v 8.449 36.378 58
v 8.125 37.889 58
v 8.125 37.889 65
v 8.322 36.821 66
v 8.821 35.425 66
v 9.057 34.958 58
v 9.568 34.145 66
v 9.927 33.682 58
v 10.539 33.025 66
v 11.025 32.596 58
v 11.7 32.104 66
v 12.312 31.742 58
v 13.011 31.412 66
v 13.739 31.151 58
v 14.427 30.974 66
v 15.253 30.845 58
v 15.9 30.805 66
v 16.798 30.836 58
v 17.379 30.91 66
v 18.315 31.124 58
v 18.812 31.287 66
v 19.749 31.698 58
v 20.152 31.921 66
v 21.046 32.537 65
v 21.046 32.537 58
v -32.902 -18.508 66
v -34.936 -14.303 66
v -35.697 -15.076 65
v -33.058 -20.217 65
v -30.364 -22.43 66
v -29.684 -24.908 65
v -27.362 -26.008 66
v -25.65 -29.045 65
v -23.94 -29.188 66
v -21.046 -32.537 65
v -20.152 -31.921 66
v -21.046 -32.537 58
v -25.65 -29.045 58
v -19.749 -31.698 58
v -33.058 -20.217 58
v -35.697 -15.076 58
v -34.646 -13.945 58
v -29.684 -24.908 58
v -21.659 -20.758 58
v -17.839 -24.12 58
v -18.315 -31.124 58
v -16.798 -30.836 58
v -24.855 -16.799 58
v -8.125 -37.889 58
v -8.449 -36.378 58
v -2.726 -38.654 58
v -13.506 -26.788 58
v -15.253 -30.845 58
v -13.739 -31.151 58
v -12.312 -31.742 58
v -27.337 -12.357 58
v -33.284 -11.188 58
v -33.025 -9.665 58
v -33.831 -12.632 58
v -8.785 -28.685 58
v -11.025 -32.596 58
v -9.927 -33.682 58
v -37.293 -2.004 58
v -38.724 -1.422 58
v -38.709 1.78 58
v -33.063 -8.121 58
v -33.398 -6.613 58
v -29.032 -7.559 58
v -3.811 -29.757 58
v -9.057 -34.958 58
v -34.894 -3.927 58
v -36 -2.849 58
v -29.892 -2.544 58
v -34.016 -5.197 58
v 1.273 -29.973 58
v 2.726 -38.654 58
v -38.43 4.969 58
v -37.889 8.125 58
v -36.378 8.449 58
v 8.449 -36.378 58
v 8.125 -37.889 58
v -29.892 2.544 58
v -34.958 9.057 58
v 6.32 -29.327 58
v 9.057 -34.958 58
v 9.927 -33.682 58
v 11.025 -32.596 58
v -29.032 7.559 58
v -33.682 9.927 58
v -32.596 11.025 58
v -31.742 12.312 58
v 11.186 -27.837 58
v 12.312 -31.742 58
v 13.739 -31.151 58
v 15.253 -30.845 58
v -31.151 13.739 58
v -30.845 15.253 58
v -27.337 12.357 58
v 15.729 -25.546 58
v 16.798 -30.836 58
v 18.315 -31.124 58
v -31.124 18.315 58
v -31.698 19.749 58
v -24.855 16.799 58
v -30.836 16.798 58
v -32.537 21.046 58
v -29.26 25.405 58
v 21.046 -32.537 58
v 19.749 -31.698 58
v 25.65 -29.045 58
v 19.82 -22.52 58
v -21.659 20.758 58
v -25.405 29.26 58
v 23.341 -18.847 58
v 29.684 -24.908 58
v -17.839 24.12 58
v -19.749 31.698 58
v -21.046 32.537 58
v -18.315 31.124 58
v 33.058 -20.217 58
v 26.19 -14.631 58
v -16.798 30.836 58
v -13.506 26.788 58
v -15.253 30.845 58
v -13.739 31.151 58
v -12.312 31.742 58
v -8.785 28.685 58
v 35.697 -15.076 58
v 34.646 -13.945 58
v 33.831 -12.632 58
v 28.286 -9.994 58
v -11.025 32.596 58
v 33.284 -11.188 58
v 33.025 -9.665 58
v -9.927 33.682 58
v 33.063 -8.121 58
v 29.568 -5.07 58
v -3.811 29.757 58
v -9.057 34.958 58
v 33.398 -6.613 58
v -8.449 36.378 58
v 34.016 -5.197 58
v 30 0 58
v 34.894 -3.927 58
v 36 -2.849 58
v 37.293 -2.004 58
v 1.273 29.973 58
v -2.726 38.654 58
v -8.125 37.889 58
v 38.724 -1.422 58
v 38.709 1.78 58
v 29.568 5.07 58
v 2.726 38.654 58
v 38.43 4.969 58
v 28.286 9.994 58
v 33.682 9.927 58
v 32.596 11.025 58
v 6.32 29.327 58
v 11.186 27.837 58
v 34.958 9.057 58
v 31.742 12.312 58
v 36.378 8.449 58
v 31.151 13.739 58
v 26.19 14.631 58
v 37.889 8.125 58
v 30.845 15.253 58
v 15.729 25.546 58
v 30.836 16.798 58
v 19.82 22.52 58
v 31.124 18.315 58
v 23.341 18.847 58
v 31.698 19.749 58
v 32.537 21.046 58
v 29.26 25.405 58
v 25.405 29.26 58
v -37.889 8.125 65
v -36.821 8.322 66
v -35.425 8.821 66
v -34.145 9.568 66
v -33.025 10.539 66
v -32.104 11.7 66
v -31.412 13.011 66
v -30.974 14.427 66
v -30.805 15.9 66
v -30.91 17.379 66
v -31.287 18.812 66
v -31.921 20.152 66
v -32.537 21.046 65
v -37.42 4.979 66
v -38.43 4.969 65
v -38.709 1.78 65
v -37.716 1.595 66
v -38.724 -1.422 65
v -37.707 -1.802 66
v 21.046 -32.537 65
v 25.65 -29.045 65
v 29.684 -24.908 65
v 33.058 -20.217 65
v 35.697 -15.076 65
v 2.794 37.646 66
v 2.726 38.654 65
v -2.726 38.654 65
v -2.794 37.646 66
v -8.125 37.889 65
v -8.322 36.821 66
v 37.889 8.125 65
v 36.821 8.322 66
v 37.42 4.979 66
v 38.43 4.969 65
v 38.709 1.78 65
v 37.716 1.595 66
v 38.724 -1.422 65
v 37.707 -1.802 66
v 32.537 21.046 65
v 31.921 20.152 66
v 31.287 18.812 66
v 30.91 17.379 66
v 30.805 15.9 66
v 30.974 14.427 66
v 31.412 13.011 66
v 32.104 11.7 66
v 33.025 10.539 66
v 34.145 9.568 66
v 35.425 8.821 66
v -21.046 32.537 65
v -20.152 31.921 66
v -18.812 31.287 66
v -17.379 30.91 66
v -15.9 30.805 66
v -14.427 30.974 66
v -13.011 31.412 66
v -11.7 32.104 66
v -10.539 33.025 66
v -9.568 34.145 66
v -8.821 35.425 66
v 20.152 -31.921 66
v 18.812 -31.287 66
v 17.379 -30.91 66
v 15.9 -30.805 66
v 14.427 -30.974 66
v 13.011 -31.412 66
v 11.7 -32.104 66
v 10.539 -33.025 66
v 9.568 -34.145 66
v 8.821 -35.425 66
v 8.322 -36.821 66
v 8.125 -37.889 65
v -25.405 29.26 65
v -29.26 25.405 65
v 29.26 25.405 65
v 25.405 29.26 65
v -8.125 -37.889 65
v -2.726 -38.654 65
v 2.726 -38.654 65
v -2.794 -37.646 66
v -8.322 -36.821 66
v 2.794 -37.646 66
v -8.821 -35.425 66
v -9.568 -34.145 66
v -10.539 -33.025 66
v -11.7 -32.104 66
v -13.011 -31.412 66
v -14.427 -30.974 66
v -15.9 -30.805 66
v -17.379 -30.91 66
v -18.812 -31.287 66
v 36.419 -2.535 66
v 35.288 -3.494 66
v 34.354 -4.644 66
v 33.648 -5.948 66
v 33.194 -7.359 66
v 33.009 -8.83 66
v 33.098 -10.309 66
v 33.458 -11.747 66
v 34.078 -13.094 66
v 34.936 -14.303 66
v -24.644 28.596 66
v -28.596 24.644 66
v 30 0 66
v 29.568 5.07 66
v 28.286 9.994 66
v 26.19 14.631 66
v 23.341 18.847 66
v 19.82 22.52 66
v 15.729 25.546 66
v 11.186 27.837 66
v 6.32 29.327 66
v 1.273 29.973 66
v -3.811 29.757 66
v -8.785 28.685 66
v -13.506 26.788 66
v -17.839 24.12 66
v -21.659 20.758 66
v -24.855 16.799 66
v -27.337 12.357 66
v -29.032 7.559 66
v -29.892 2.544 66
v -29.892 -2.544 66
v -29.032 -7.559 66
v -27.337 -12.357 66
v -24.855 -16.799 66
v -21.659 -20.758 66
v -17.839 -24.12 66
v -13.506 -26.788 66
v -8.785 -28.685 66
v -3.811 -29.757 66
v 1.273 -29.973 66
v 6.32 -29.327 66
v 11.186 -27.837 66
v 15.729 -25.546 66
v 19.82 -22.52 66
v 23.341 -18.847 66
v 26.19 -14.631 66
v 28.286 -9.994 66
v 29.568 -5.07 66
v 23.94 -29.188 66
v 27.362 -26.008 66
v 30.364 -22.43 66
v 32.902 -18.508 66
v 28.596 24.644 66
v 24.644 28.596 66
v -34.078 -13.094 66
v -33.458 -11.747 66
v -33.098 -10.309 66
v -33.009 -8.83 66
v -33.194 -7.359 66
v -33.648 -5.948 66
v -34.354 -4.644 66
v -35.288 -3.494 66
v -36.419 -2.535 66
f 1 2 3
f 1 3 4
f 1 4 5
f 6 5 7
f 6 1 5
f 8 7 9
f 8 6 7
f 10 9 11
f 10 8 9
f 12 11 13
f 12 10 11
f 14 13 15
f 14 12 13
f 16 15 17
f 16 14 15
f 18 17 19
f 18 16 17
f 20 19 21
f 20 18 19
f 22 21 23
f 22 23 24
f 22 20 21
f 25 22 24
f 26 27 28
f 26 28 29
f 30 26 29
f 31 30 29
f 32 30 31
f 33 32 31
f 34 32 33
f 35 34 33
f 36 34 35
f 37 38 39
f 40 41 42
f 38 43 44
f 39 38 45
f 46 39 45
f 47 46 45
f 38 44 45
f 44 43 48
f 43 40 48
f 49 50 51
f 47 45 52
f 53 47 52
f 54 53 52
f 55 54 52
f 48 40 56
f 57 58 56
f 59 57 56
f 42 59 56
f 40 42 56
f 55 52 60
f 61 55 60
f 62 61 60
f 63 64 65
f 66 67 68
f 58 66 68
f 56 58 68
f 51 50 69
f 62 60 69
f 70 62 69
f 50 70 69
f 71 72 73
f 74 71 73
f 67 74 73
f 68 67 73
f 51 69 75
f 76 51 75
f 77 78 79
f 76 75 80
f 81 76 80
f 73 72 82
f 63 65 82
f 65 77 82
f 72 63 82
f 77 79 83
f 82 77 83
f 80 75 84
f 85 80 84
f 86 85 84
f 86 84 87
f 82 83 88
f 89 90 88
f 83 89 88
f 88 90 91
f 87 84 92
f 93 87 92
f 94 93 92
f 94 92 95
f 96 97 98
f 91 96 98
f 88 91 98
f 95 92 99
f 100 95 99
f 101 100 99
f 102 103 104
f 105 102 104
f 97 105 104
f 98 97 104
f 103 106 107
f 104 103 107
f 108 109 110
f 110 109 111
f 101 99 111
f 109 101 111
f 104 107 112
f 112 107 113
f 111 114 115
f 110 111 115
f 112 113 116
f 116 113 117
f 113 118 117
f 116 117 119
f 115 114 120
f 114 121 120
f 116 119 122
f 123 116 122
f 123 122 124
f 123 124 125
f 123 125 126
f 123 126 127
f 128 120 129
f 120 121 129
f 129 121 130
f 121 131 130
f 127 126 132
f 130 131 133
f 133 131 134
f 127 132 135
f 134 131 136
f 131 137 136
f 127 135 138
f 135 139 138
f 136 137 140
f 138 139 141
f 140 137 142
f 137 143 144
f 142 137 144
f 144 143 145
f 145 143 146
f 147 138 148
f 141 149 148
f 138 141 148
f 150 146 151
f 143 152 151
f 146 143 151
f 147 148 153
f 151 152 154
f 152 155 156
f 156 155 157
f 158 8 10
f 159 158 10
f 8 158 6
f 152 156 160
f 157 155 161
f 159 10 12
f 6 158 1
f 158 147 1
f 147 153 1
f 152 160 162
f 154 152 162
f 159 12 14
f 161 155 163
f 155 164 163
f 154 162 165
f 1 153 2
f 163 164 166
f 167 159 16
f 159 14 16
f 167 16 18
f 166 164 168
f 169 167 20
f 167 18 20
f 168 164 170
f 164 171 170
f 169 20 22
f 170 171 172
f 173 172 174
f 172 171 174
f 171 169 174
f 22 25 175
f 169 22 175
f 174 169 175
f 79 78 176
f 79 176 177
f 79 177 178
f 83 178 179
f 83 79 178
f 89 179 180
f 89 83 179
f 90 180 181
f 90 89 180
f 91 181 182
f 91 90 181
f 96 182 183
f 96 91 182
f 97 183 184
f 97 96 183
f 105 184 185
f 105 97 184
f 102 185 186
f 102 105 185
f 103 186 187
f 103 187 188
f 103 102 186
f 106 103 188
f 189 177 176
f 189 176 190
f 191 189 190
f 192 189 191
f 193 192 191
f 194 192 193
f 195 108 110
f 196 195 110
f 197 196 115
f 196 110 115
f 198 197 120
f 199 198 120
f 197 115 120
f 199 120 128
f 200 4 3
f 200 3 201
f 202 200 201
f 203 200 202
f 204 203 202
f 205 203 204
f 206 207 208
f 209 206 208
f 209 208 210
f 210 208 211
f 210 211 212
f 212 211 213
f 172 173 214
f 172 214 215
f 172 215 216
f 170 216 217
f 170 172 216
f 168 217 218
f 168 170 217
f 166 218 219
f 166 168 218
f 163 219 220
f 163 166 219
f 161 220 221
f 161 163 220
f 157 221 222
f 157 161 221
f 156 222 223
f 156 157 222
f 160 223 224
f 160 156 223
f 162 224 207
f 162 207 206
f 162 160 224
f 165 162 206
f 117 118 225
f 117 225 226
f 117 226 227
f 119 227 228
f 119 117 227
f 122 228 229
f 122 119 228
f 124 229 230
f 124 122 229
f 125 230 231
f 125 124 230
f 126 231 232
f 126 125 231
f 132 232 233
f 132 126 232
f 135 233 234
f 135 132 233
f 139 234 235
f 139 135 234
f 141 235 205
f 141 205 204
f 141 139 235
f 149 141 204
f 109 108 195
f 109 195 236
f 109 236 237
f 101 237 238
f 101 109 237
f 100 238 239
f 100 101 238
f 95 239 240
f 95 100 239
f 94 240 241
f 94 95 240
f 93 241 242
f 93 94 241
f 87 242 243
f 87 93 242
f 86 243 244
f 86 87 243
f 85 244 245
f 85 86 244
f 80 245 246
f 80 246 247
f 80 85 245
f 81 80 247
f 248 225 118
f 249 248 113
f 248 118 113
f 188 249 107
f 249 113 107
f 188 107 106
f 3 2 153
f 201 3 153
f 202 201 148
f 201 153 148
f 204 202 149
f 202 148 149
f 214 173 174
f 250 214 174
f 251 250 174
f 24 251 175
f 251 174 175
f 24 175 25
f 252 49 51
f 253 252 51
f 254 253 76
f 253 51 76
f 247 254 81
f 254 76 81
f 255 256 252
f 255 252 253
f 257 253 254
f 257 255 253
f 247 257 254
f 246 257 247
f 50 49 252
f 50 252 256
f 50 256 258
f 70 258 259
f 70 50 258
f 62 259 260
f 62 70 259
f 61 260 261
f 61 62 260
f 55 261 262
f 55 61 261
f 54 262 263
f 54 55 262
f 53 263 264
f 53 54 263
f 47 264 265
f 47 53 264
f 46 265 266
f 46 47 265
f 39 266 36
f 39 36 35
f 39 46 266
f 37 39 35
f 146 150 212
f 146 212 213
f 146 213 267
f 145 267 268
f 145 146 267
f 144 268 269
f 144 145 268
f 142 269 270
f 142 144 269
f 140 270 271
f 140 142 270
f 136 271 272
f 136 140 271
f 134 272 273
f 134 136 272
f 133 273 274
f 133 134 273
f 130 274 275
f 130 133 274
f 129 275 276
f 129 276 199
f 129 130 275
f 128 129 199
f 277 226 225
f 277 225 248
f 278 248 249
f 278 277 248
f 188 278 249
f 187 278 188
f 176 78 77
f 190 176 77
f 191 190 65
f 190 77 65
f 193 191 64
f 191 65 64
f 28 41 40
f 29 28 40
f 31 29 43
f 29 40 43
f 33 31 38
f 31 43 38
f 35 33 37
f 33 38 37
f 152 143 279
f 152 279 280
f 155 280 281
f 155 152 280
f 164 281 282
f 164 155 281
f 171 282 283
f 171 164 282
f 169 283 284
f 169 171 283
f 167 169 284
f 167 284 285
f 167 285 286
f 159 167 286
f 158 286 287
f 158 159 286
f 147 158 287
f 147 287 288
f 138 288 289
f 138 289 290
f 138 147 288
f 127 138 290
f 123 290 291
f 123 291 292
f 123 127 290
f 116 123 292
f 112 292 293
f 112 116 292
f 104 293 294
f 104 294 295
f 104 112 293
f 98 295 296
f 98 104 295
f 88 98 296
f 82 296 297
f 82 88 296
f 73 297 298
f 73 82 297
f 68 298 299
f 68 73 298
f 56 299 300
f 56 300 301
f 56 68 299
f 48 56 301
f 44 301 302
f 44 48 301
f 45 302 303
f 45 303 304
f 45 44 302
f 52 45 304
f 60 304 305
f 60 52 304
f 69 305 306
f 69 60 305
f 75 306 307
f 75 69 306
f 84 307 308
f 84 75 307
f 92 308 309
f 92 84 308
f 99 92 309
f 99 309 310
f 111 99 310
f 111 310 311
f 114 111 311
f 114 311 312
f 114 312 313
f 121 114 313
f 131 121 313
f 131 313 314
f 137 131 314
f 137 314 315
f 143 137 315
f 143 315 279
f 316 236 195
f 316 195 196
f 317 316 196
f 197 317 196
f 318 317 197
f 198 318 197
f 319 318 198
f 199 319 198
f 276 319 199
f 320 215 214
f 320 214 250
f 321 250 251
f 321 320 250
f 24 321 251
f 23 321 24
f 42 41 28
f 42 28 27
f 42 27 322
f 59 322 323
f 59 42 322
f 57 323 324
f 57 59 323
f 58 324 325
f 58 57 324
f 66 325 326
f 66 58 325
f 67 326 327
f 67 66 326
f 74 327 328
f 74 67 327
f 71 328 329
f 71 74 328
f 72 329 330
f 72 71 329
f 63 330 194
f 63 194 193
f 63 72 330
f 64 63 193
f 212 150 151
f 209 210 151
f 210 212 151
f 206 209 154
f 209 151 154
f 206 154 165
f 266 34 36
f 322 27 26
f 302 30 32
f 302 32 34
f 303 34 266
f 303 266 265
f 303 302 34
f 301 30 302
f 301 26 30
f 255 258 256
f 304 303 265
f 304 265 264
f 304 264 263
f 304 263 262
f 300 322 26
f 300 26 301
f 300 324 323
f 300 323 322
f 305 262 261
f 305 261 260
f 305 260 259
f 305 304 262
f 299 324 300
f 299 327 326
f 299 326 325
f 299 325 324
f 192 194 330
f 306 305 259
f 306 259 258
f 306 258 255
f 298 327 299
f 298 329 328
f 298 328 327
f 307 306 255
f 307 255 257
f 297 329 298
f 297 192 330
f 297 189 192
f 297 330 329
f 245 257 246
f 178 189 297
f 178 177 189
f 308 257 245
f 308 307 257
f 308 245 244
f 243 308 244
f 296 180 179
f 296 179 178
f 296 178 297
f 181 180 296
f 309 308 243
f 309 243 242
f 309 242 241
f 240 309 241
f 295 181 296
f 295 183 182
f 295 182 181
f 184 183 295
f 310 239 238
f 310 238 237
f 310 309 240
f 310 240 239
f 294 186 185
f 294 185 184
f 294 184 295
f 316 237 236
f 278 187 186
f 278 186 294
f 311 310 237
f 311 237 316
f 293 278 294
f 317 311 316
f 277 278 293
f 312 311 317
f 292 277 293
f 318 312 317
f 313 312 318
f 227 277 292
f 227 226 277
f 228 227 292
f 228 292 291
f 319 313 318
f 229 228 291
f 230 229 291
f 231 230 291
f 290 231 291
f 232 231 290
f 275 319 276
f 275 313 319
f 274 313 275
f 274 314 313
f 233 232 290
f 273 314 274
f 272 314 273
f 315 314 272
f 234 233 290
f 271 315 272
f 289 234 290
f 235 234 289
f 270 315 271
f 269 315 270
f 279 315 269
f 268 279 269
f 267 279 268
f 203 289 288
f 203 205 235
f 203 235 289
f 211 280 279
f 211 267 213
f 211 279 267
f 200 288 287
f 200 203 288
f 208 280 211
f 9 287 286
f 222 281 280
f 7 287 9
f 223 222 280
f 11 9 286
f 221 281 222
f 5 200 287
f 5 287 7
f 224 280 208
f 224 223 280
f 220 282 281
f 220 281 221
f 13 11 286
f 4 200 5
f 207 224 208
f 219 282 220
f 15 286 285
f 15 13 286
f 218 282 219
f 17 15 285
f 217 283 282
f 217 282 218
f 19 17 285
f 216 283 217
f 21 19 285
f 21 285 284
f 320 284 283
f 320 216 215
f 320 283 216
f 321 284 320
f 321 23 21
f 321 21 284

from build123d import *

# Parameters (mm, degrees)
CYLINDER749_R               = 8
CYLINDER749_DEPTH           = 20
CYLINDER749_PLACEMENT_ANGLE = 100
CYLINDER747_R               = 8
CYLINDER747_DEPTH           = 20
CYLINDER747_PLACEMENT_ANGLE = 135
CYLINDER751_R               = 8
CYLINDER751_DEPTH           = 20
CYLINDER753_R               = 8
CYLINDER753_DEPTH           = 20
CYLINDER753_PLACEMENT_ANGLE = 225
CYLINDER746_R               = 8
CYLINDER746_DEPTH           = 20
CYLINDER750_R               = 8
CYLINDER750_DEPTH           = 20
CYLINDER750_PLACEMENT_ANGLE = 55
CYLINDER748_R               = 8
CYLINDER748_DEPTH           = 20
CYLINDER752_R               = 8
CYLINDER752_DEPTH           = 20
CYLINDER752_PLACEMENT_ANGLE = 45
TUBE081_R                   = 38.75
TUBE081_R_2                 = 30
TUBE081_DEPTH               = 8
CHAMFER004_SIZE             = 1


with BuildPart() as v_lec749:
    # Cylinder749 → Cylinder749 (new body)
    with BuildSketch(Plane.XY):
        Circle(CYLINDER749_R)
    extrude(amount=CYLINDER749_DEPTH)


with BuildPart() as v_lec749_1:
    # Cylinder749 placement: moved
    add(v_lec749.part.moved(Location((41.004432, -9.090464, 0))).rotate(Axis((41.004432, -9.090464, 0), (0, 0, 1)), CYLINDER749_PLACEMENT_ANGLE))


with BuildPart() as v_lec747:
    # Cylinder747 → Cylinder747 (new body)
    with BuildSketch(Plane.XY):
        Circle(CYLINDER747_R)
    extrude(amount=CYLINDER747_DEPTH)


with BuildPart() as v_lec747_1:
    # Cylinder747 placement: moved
    add(v_lec747.part.moved(Location((38.80294, 16.072704, 0))).rotate(Axis((38.80294, 16.072704, 0), (0, 0, 1)), CYLINDER747_PLACEMENT_ANGLE))


with BuildPart() as v_lec751:
    # Cylinder751 → Cylinder751 (new body)
    with BuildSketch(Plane(origin=(16.072704, 38.80294, 0), x_dir=(-1, 0, 0), z_dir=(0, 0, 1))):
        Circle(CYLINDER751_R)
    extrude(amount=CYLINDER751_DEPTH)


with BuildPart() as v_lec753:
    # Cylinder753 → Cylinder753 (new body)
    with BuildSketch(Plane.XY):
        Circle(CYLINDER753_R)
    extrude(amount=CYLINDER753_DEPTH)


with BuildPart() as v_lec753_1:
    # Cylinder753 placement: moved
    add(v_lec753.part.moved(Location((-16.072704, 38.80294, 0))).rotate(Axis((-16.072704, 38.80294, 0), (0, 0, 1)), CYLINDER753_PLACEMENT_ANGLE))


with BuildPart() as v_lec746:
    # Cylinder746 → Cylinder746 (new body)
    with BuildSketch(Plane(origin=(-38.80294, 16.072704, 0), x_dir=(0, -1, 0), z_dir=(0, 0, 1))):
        Circle(CYLINDER746_R)
    extrude(amount=CYLINDER746_DEPTH)


with BuildPart() as v_lec750:
    # Cylinder750 → Cylinder750 (new body)
    with BuildSketch(Plane.XY):
        Circle(CYLINDER750_R)
    extrude(amount=CYLINDER750_DEPTH)


with BuildPart() as v_lec750_1:
    # Cylinder750 placement: moved
    add(v_lec750.part.moved(Location((-41.004432, -9.090464, 0))).rotate(Axis((-41.004432, -9.090464, 0), (0, 0, -1)), CYLINDER750_PLACEMENT_ANGLE))


with BuildPart() as v_lec748:
    # Cylinder748 → Cylinder748 (new body)
    with BuildSketch(Plane(origin=(-16.072704, -38.80294, 0), x_dir=(1, 0, 0), z_dir=(0, 0, 1))):
        Circle(CYLINDER748_R)
    extrude(amount=CYLINDER748_DEPTH)


with BuildPart() as compound708:
    # Cylinder752 → Cylinder752 (new body)
    with BuildSketch(Plane.XY):
        Circle(CYLINDER752_R)
    extrude(amount=CYLINDER752_DEPTH)


with BuildPart() as compound708_1:
    # Cylinder752 placement: moved
    add(compound708.part.moved(Location((16.072704, -38.80294, 0))).rotate(Axis((16.072704, -38.80294, 0), (0, 0, 1)), CYLINDER752_PLACEMENT_ANGLE))

    # Compound708: union Válec749, Válec747, Válec751, Válec753, Válec746, Válec750, Válec748
    add(v_lec749_1.part)
    add(v_lec747_1.part)
    add(v_lec751.part)
    add(v_lec753_1.part)
    add(v_lec746.part)
    add(v_lec750_1.part)
    add(v_lec748.part)


with BuildPart() as compound708_2:
    # Compound708 placement: moved
    add(compound708_1.part.moved(Location((0, 0, 56))))


with BuildPart() as chamfer004:
    # Tube081 → Tube081 (new body)
    with BuildSketch(Plane.XY.offset(58)):
        Circle(TUBE081_R)
        Circle(TUBE081_R_2, mode=Mode.SUBTRACT)
    extrude(amount=TUBE081_DEPTH)

    # Cut331: cut Compound708
    add(compound708_2.part, mode=Mode.SUBTRACT)

    # Chamfer004
    chamfer004_edges = [chamfer004.edges().sort_by_distance(p)[0] for p in [
        (38.743471, -0.711323, 66),
        (38.534044, 4.085332, 66),
        (29.684222, -24.90802, 66),
        (0, -38.75, 66),
        (-29.684222, -24.90802, 66),
        (-38.602545, 3.377285, 66),
        (-27.400388, 27.400388, 66),
        (0, 38.75, 66),
        (27.400388, 27.400388, 66),
    ]]
    chamfer(chamfer004_edges, length=CHAMFER004_SIZE)


solid = chamfer004.part
